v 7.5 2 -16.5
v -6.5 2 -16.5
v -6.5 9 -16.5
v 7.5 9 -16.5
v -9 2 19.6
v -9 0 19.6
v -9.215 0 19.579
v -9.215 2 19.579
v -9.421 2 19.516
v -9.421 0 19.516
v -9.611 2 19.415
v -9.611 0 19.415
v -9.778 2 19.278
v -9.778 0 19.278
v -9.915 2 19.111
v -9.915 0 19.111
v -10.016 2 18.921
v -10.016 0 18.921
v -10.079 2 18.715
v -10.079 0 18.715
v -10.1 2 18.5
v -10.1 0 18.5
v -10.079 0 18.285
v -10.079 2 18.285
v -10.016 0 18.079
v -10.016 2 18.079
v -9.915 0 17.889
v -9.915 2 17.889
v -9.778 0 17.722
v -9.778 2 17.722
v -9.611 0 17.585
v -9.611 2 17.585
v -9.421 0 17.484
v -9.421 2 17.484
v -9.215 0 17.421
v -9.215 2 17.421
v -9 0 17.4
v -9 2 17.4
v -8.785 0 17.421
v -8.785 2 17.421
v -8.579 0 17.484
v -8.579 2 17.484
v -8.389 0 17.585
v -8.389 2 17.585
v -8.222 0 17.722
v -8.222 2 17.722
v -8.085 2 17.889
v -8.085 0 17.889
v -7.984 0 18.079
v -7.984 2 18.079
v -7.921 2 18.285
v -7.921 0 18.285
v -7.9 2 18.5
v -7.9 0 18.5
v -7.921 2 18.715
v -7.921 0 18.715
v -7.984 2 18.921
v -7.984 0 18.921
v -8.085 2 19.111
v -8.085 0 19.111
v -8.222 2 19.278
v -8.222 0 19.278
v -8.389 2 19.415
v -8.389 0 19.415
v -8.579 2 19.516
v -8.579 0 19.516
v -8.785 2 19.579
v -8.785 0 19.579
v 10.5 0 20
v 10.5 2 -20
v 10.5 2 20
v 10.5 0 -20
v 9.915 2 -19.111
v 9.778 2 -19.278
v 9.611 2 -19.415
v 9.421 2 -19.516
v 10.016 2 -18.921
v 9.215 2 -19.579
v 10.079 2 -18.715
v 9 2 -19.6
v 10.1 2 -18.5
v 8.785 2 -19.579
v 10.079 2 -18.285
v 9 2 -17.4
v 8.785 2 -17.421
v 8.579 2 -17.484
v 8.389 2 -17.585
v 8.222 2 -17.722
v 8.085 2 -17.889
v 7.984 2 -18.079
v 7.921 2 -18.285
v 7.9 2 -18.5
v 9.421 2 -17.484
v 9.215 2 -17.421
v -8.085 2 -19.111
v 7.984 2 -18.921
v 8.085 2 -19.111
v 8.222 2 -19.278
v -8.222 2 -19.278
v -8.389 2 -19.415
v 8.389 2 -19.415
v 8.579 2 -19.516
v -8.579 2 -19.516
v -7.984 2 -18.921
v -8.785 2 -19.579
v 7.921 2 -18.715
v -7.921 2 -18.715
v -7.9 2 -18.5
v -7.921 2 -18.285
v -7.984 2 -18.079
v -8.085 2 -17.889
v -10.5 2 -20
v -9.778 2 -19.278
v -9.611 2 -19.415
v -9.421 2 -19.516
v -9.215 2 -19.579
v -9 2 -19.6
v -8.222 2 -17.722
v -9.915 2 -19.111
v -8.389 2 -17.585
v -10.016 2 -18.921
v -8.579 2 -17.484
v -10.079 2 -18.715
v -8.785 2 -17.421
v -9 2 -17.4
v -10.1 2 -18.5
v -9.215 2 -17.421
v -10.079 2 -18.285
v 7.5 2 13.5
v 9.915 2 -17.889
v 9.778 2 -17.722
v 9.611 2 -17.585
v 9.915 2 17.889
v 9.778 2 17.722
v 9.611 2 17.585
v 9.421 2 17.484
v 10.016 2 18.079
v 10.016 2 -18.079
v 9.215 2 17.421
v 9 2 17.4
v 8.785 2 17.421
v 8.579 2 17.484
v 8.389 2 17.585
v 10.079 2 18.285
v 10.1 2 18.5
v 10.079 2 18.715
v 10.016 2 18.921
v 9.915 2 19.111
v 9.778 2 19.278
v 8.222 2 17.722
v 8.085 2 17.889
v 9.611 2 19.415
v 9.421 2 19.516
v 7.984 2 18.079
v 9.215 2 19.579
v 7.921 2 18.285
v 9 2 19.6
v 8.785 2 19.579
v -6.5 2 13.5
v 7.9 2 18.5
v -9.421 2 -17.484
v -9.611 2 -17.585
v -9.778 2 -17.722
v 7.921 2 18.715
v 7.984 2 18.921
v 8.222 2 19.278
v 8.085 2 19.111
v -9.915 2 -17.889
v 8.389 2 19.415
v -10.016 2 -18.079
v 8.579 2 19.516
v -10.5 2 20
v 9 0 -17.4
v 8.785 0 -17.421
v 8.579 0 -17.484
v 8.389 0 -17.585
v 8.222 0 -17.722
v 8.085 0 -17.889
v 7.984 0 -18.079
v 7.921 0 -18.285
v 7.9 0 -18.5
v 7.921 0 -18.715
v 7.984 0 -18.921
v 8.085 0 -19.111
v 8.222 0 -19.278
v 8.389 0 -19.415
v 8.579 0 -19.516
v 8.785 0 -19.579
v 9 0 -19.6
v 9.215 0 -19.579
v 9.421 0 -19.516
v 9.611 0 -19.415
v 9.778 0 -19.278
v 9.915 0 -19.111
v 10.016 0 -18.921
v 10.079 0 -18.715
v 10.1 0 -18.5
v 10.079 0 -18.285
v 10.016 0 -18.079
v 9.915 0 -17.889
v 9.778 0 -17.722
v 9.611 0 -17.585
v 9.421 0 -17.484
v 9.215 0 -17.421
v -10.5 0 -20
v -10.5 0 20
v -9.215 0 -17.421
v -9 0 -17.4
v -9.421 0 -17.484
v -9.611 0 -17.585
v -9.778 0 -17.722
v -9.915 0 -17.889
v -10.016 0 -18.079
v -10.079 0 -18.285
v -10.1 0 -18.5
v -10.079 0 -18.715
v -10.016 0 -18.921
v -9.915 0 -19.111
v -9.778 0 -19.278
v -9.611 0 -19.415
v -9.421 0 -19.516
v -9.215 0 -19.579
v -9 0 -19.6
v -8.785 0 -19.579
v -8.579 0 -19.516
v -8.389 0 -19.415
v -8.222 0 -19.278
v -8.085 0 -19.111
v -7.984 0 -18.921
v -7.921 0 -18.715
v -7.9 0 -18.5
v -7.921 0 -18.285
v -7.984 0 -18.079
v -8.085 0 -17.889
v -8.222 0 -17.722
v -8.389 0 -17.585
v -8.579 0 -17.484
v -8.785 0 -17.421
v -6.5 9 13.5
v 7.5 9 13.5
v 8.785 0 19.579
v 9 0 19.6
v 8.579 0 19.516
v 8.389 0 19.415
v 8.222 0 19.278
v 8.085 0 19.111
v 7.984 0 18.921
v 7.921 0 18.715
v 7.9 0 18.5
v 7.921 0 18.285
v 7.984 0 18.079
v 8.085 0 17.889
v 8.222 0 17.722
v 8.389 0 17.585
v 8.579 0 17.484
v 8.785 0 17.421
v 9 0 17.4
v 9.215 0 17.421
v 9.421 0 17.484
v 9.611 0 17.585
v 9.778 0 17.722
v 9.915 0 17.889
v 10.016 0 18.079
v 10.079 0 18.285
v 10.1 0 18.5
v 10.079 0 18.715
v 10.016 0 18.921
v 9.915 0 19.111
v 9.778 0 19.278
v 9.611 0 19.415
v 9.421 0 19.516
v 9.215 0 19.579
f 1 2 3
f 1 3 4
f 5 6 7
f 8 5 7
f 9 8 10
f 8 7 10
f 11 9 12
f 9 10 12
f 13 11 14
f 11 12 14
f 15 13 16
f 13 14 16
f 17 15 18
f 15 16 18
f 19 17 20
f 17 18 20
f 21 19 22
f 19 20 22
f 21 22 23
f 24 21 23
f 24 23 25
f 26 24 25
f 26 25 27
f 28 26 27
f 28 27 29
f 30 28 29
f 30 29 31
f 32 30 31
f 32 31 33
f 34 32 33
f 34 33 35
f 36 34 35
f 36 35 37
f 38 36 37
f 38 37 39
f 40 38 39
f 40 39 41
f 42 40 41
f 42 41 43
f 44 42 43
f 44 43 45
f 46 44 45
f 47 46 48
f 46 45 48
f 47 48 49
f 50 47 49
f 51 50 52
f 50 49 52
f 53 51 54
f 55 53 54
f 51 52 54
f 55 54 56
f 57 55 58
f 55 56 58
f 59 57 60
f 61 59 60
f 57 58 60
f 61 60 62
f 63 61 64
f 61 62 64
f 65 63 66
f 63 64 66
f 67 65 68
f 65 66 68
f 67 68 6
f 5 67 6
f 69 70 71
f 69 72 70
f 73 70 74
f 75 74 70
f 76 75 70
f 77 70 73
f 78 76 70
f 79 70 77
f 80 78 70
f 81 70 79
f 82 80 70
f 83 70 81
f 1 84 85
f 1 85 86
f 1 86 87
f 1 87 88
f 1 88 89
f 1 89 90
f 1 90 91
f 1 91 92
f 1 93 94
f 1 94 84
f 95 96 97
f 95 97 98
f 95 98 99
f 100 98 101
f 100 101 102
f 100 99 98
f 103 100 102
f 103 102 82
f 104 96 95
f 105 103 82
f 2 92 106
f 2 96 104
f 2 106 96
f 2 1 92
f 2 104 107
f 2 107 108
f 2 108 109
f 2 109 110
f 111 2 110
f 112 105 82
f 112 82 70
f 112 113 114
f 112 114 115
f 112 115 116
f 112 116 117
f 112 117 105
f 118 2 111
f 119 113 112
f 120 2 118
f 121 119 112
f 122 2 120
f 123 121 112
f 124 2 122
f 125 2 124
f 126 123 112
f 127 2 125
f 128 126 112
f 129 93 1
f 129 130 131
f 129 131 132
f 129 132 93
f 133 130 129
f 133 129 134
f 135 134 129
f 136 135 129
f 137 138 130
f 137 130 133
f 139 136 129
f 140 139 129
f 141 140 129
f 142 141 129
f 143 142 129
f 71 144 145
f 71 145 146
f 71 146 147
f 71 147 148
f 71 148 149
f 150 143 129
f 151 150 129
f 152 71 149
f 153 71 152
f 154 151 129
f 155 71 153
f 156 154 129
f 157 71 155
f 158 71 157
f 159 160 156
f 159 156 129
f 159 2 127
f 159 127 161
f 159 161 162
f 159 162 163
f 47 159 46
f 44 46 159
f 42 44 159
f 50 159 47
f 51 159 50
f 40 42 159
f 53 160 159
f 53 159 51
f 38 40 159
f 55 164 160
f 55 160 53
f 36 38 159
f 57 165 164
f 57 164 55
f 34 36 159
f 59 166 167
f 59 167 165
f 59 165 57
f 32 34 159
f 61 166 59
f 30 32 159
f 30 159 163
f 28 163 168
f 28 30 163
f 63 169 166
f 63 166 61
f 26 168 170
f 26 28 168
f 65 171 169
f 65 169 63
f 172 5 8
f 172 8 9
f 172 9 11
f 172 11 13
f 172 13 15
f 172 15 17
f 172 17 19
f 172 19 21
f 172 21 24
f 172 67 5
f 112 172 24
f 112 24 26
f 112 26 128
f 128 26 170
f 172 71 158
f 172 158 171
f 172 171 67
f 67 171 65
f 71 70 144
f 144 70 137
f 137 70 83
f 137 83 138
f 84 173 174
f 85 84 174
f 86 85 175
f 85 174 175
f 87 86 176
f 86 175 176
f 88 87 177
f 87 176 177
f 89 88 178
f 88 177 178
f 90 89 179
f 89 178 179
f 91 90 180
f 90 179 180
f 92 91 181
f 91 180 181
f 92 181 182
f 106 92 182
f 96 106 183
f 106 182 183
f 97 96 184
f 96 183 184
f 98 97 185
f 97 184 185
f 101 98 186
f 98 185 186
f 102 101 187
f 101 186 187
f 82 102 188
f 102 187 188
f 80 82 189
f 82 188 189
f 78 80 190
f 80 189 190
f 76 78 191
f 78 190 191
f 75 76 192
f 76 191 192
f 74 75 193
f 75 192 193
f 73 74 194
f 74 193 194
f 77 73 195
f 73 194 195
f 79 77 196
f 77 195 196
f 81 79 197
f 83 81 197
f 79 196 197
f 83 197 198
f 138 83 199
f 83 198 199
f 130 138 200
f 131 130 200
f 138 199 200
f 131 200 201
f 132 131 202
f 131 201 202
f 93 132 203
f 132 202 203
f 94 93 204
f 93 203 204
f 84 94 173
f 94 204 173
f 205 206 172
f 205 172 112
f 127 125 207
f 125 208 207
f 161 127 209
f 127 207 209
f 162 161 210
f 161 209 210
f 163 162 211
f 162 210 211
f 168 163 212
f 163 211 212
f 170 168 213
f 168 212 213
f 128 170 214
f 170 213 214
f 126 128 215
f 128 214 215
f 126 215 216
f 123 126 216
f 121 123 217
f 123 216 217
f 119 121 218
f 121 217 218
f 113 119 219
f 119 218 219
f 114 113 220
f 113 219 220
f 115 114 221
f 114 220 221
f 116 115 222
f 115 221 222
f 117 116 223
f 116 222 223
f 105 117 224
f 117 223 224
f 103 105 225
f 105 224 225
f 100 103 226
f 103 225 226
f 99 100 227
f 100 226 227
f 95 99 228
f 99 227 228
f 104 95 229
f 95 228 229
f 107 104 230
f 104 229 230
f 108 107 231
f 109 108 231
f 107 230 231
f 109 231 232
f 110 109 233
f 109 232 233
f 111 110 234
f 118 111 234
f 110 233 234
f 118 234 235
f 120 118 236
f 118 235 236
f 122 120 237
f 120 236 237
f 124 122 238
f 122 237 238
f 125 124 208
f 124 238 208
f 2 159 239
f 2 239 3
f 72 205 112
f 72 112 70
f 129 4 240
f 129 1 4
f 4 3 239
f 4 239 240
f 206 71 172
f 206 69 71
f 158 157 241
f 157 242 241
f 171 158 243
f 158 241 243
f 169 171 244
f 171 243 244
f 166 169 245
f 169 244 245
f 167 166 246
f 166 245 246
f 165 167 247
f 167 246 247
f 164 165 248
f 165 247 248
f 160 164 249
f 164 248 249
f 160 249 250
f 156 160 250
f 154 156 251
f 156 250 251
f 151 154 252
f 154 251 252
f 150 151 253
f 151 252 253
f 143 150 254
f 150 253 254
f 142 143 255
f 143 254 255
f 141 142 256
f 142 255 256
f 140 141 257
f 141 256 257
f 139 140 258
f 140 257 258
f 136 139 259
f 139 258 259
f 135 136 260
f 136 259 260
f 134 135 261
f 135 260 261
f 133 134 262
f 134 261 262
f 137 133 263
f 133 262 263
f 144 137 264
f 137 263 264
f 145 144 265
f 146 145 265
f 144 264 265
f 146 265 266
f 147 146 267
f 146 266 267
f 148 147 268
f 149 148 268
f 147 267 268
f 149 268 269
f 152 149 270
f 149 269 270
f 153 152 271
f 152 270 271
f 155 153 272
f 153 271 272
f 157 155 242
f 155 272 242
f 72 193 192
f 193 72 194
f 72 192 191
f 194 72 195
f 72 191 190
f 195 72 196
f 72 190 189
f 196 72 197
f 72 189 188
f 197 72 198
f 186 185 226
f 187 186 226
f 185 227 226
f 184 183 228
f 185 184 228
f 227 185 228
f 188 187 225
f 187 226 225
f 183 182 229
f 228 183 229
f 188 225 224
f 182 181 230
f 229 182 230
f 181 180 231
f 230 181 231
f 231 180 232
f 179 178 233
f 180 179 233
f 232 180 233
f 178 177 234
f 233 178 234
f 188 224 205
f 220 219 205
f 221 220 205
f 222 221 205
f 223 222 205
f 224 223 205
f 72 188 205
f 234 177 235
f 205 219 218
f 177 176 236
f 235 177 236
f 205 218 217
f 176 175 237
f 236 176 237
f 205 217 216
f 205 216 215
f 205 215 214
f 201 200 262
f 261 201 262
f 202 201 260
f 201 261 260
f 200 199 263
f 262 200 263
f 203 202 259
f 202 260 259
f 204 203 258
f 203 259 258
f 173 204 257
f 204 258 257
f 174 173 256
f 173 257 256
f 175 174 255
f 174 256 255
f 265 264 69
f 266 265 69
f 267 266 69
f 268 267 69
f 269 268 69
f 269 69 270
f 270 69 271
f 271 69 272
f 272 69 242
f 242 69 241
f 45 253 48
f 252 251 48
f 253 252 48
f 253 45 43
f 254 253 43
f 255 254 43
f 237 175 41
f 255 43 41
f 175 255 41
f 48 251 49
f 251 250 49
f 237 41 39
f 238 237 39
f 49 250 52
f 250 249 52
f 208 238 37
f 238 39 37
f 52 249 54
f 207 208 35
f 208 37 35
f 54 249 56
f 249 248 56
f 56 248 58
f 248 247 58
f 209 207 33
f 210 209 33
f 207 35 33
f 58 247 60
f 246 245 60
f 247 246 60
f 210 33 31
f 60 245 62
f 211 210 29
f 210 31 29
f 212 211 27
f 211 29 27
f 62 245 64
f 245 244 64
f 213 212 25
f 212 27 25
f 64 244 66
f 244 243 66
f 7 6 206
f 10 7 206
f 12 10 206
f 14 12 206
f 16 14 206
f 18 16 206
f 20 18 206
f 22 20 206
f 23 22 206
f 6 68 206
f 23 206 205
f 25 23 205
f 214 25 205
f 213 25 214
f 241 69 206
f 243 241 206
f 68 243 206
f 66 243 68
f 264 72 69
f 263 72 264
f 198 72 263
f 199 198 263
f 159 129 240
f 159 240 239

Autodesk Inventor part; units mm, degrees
ref_plane "YZ Plane" through (0, 0, 0) normal (1, 0, 0) x (0, 1, 0)
ref_plane "XZ Plane" through (0, 0, 0) normal (0, 1, 0) x (-1, 0, 0)
ref_plane "XY Plane" through (0, 0, 0) normal (0, 0, 1) x (1, 0, 0)
sketch "Sketch1" plane through (0, 0, 0) normal (0, 1, 0) x (-1, 0, 0)
  line L0 (-10.5, 20) -> (10.5, 20)
  line L1 (10.5, 20) -> (10.5, -20)
  line L2 (10.5, -20) -> (-10.5, -20)
  line L3 (-10.5, -20) -> (-10.5, 20)
  line L4 (-10.5, 20) -> (10.5, -20) construction
  line L5 (10.5, 20) -> (-10.5, -20) construction
  point P0 (0, 0)
  dimension "d0" = 40
  dimension "d1" = 21
extrude "Extrusion1" add sketch "Sketch1" along normal blind 2
sketch "Sketch2" plane through (0, 2, 0) normal (0, 1, 0) x (1, 0, 0)
  line L0 (-10.5, 20) -> (-10.5, -20) projected
  line L1 (-10.5, -20) -> (10.5, -20) projected
  line L2 (10.5, -20) -> (10.5, 20) projected
  line L3 (10.5, 20) -> (-10.5, 20) projected
  point P0 (0, 0)
  point P1 (-9, -18.5)
  point P2 (-9, 18.5)
  point P3 (9, 18.5)
  point P4 (9, -18.5)
  dimension "d4" = 1.5
  dimension "d5" = 1.5
  dimension "d6" = 1.5
  dimension "d7" = 1.5
  dimension "d20" = 18
  dimension "d21" = 18
  dimension "d22" = 37
hole "Hole1" at (-9, 2, 18.5) at (-9, 2, -18.5) at (9, 2, -18.5) at (9, 2, 18.5) direction (0, -1, 0) diameter 2.2 end through all
sketch "Sketch3" plane through (0, 2, 0) normal (0, 1, 0) x (1, 0, 0)
  line L0 (7.5, -13.5) -> (-6.5, -13.5)
  line L1 (-6.5, -13.5) -> (-6.5, 16.5)
  line L2 (-6.5, 16.5) -> (7.5, 16.5)
  line L3 (7.5, 16.5) -> (7.5, -13.5)
  line L4 (7.5, -13.5) -> (-6.5, 16.5) construction
  line L5 (-6.5, -13.5) -> (7.5, 16.5) construction
  line L6 (-10.5, -20) -> (10.5, -20) projected
  line L7 (-10.5, 20) -> (-10.5, -20) projected
  line L8 (10.5, 20) -> (-10.5, 20) projected
  point P0 (0, 0)
  point P1 (0.5, 1.5)
  point P2 (0, -20)
  dimension "d15" = 6.5
  dimension "d16" = 30
  dimension "d17" = 14
  dimension "d18" = 4
  dimension "d19" = 3.5
extrude "Extrusion2" add sketch "Sketch3" along normal blind 7
properties part number "7_Seg_Display_TM1637"
